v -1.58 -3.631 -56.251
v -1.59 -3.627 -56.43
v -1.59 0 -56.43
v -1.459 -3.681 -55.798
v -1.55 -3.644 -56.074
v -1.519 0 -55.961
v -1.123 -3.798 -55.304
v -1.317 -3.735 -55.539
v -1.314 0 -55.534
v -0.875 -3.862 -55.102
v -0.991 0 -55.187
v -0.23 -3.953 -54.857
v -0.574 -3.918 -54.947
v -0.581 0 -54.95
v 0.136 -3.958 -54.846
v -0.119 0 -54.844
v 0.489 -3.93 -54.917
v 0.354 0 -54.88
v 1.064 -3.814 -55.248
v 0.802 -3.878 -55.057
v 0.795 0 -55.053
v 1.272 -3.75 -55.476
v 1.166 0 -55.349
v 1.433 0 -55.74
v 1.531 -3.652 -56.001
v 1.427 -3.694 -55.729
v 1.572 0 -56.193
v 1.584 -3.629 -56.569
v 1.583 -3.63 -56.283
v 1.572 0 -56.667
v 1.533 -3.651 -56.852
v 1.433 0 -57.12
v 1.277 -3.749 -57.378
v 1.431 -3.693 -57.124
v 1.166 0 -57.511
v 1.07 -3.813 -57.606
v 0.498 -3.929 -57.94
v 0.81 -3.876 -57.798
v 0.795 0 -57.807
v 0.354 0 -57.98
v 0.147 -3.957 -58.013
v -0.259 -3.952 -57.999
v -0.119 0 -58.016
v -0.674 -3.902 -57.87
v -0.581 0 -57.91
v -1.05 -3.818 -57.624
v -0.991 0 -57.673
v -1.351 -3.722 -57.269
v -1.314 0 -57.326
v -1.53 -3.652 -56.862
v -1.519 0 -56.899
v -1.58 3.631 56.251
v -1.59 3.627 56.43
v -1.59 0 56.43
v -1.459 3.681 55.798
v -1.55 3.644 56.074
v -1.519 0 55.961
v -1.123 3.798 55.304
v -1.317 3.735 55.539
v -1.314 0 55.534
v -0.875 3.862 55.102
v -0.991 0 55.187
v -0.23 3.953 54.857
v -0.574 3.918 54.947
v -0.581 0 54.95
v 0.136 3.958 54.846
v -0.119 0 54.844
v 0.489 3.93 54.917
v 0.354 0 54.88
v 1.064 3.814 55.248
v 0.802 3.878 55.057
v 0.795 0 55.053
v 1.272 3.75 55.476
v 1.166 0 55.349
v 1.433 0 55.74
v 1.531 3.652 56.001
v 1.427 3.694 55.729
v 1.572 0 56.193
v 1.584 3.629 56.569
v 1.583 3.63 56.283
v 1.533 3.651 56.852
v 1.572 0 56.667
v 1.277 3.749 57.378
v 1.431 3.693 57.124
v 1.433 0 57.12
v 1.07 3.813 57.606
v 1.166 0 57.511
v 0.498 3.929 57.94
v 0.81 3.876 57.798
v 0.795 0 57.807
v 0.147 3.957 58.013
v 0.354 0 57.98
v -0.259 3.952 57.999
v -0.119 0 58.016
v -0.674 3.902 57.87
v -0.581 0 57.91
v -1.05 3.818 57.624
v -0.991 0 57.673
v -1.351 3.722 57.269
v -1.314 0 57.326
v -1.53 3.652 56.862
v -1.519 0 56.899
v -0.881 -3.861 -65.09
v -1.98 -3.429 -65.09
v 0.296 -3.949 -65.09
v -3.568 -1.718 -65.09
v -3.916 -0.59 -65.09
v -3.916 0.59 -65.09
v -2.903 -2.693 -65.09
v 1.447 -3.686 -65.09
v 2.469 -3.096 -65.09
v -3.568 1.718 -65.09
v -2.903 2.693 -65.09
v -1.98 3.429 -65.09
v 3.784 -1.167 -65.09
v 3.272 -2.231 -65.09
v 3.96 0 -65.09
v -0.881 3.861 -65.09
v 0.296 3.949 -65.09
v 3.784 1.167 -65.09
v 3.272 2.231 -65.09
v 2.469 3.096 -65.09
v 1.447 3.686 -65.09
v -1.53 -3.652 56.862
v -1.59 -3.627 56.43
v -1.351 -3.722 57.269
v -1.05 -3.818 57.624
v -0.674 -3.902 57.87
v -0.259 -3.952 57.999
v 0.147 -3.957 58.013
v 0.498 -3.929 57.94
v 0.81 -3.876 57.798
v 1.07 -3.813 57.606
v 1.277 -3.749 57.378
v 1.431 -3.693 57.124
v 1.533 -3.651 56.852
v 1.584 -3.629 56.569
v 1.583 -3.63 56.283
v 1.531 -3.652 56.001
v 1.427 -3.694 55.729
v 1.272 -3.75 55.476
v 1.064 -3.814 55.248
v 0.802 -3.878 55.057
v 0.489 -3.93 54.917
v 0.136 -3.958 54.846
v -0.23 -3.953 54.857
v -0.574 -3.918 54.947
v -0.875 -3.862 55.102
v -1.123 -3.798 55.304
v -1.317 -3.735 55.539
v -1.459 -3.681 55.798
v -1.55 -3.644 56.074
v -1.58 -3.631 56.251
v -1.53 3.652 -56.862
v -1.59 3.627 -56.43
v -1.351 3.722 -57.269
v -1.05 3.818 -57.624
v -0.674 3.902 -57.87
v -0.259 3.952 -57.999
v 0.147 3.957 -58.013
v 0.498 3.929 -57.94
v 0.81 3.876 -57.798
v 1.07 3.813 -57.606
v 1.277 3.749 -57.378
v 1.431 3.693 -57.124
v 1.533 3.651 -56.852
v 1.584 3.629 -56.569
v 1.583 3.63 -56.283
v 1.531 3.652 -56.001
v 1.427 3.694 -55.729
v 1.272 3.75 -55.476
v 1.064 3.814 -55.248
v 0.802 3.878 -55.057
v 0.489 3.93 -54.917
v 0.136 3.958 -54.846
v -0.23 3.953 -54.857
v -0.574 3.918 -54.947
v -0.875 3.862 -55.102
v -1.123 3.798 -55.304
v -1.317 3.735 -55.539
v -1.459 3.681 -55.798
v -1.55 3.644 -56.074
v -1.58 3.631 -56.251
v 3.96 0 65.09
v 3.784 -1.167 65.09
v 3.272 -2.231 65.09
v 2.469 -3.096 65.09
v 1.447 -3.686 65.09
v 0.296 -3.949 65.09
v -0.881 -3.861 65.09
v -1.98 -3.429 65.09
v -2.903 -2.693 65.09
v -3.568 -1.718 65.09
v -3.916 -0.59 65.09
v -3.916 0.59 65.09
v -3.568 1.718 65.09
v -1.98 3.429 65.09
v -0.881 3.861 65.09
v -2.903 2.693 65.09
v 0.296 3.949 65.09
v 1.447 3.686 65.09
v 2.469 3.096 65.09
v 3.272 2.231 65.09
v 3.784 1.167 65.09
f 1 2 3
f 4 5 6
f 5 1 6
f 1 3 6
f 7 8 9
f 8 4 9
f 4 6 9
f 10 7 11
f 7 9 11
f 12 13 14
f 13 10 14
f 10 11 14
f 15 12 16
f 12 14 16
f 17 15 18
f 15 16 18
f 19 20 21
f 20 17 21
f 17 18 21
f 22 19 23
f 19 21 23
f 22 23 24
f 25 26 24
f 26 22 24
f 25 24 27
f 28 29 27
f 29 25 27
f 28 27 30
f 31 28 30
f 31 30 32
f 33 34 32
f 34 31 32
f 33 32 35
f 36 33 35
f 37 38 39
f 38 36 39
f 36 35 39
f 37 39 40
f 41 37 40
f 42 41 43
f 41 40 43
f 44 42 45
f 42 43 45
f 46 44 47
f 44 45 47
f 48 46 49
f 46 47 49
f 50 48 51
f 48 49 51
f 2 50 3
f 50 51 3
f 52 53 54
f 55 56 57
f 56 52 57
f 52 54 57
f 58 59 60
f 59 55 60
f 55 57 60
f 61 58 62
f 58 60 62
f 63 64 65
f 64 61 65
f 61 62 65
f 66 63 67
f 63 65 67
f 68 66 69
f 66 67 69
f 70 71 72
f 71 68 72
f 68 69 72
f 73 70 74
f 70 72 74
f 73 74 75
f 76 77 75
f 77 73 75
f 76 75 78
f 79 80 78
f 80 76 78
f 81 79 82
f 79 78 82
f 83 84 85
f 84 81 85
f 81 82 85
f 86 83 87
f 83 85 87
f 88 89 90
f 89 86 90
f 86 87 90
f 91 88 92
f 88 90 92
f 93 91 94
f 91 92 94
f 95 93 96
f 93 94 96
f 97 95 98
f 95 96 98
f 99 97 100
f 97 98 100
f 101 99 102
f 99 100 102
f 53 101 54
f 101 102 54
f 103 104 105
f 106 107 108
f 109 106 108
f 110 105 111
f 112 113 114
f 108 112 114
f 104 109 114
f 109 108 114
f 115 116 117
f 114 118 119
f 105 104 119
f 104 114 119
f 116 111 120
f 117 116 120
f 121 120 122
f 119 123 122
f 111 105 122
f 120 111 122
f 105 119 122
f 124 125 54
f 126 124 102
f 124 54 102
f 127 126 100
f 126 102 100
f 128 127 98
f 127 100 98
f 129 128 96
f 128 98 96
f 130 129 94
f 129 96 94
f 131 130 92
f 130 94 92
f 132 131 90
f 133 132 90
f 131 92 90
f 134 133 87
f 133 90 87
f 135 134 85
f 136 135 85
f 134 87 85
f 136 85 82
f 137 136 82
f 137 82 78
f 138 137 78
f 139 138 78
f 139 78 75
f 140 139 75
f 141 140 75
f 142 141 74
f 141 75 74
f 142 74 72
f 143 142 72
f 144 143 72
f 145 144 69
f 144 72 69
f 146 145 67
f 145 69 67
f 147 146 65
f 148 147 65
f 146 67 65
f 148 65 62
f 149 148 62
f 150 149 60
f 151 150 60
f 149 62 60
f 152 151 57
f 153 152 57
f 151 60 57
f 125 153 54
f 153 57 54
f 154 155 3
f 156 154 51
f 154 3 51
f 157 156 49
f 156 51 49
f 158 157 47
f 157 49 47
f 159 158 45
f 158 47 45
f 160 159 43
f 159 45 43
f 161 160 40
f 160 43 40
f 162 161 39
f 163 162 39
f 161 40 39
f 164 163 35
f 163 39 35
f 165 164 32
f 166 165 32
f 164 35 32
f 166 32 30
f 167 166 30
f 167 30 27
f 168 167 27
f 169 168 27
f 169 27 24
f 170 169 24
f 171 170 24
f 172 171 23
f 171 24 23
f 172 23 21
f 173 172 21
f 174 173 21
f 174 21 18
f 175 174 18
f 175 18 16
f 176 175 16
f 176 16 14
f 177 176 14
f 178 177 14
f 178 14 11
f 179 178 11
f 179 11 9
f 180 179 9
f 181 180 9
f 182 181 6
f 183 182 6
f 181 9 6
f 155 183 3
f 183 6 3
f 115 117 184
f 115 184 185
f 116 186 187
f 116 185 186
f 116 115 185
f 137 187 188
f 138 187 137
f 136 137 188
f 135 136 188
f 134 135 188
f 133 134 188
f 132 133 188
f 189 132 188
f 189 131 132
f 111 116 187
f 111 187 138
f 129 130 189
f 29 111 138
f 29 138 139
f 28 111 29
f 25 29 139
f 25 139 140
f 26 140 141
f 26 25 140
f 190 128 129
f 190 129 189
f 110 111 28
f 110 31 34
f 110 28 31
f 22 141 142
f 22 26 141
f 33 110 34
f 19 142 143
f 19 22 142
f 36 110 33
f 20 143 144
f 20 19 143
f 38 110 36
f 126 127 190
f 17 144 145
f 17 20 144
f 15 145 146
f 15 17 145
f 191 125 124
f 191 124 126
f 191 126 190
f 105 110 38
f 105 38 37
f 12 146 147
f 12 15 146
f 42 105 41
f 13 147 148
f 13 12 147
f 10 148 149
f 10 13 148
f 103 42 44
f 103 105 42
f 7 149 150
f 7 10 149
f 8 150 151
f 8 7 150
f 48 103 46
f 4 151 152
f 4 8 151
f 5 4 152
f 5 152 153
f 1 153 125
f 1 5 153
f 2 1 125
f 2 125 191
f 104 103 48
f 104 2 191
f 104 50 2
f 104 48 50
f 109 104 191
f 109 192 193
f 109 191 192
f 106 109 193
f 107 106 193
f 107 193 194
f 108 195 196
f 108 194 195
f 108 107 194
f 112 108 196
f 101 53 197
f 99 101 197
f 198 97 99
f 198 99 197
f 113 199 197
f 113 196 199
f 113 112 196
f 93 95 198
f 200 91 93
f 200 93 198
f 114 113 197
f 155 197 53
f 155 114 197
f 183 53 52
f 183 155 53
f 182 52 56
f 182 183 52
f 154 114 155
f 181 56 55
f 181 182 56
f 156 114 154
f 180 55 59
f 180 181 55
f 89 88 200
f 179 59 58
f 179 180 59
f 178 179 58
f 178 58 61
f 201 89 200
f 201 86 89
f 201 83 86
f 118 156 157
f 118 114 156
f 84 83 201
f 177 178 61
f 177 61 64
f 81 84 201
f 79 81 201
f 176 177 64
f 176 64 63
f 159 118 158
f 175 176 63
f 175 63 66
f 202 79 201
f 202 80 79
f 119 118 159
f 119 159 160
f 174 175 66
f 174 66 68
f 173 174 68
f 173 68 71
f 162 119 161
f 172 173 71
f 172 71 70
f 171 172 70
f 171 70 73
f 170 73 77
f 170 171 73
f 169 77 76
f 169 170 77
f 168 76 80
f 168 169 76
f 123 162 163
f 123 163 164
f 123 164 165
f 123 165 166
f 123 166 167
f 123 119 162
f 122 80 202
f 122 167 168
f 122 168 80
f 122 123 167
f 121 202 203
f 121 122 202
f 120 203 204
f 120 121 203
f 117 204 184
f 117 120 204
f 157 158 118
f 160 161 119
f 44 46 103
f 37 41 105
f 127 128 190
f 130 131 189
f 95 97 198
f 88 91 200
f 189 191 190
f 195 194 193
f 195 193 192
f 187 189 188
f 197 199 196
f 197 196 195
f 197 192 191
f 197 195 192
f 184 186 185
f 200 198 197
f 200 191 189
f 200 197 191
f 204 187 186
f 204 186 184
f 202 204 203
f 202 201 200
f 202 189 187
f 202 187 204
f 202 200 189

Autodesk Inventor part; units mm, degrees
ref_plane "YZ Plane" through (0, 0, 0) normal (1, 0, 0) x (0, 1, 0)
ref_plane "XZ Plane" through (0, 0, 0) normal (0, 1, 0) x (-1, 0, 0)
ref_plane "XY Plane" through (0, 0, 0) normal (0, 0, 1) x (1, 0, 0)
sketch "Sketch1" plane through (0, 0, 0) normal (0, 0, 1) x (1, 0, 0)
  circle A0 centre (0, 0) radius 3.96
  dimension "d0" = 7.92
extrude "Extrusion1" add sketch "Sketch1" along normal mid plane 130.18
sketch "Sketch2" plane through (0, 0, 0) normal (0, 1, 0) x (-1, 0, 0)
  circle A0 centre (0, 56.43) radius 1.59
  line L0 (3.96, 65.09) -> (-3.96, 65.09) projected
  point P0 (0, 0)
  dimension "d3" = 3.18
  dimension "d4" = 8.66
extrude "Extrusion2" cut sketch "Sketch2" along normal mid plane 130.18
mirror "Mirror1" about plane through (0, 0, 0) normal (0, 0, 1) of "Extrusion2"
properties part number "parca4"
